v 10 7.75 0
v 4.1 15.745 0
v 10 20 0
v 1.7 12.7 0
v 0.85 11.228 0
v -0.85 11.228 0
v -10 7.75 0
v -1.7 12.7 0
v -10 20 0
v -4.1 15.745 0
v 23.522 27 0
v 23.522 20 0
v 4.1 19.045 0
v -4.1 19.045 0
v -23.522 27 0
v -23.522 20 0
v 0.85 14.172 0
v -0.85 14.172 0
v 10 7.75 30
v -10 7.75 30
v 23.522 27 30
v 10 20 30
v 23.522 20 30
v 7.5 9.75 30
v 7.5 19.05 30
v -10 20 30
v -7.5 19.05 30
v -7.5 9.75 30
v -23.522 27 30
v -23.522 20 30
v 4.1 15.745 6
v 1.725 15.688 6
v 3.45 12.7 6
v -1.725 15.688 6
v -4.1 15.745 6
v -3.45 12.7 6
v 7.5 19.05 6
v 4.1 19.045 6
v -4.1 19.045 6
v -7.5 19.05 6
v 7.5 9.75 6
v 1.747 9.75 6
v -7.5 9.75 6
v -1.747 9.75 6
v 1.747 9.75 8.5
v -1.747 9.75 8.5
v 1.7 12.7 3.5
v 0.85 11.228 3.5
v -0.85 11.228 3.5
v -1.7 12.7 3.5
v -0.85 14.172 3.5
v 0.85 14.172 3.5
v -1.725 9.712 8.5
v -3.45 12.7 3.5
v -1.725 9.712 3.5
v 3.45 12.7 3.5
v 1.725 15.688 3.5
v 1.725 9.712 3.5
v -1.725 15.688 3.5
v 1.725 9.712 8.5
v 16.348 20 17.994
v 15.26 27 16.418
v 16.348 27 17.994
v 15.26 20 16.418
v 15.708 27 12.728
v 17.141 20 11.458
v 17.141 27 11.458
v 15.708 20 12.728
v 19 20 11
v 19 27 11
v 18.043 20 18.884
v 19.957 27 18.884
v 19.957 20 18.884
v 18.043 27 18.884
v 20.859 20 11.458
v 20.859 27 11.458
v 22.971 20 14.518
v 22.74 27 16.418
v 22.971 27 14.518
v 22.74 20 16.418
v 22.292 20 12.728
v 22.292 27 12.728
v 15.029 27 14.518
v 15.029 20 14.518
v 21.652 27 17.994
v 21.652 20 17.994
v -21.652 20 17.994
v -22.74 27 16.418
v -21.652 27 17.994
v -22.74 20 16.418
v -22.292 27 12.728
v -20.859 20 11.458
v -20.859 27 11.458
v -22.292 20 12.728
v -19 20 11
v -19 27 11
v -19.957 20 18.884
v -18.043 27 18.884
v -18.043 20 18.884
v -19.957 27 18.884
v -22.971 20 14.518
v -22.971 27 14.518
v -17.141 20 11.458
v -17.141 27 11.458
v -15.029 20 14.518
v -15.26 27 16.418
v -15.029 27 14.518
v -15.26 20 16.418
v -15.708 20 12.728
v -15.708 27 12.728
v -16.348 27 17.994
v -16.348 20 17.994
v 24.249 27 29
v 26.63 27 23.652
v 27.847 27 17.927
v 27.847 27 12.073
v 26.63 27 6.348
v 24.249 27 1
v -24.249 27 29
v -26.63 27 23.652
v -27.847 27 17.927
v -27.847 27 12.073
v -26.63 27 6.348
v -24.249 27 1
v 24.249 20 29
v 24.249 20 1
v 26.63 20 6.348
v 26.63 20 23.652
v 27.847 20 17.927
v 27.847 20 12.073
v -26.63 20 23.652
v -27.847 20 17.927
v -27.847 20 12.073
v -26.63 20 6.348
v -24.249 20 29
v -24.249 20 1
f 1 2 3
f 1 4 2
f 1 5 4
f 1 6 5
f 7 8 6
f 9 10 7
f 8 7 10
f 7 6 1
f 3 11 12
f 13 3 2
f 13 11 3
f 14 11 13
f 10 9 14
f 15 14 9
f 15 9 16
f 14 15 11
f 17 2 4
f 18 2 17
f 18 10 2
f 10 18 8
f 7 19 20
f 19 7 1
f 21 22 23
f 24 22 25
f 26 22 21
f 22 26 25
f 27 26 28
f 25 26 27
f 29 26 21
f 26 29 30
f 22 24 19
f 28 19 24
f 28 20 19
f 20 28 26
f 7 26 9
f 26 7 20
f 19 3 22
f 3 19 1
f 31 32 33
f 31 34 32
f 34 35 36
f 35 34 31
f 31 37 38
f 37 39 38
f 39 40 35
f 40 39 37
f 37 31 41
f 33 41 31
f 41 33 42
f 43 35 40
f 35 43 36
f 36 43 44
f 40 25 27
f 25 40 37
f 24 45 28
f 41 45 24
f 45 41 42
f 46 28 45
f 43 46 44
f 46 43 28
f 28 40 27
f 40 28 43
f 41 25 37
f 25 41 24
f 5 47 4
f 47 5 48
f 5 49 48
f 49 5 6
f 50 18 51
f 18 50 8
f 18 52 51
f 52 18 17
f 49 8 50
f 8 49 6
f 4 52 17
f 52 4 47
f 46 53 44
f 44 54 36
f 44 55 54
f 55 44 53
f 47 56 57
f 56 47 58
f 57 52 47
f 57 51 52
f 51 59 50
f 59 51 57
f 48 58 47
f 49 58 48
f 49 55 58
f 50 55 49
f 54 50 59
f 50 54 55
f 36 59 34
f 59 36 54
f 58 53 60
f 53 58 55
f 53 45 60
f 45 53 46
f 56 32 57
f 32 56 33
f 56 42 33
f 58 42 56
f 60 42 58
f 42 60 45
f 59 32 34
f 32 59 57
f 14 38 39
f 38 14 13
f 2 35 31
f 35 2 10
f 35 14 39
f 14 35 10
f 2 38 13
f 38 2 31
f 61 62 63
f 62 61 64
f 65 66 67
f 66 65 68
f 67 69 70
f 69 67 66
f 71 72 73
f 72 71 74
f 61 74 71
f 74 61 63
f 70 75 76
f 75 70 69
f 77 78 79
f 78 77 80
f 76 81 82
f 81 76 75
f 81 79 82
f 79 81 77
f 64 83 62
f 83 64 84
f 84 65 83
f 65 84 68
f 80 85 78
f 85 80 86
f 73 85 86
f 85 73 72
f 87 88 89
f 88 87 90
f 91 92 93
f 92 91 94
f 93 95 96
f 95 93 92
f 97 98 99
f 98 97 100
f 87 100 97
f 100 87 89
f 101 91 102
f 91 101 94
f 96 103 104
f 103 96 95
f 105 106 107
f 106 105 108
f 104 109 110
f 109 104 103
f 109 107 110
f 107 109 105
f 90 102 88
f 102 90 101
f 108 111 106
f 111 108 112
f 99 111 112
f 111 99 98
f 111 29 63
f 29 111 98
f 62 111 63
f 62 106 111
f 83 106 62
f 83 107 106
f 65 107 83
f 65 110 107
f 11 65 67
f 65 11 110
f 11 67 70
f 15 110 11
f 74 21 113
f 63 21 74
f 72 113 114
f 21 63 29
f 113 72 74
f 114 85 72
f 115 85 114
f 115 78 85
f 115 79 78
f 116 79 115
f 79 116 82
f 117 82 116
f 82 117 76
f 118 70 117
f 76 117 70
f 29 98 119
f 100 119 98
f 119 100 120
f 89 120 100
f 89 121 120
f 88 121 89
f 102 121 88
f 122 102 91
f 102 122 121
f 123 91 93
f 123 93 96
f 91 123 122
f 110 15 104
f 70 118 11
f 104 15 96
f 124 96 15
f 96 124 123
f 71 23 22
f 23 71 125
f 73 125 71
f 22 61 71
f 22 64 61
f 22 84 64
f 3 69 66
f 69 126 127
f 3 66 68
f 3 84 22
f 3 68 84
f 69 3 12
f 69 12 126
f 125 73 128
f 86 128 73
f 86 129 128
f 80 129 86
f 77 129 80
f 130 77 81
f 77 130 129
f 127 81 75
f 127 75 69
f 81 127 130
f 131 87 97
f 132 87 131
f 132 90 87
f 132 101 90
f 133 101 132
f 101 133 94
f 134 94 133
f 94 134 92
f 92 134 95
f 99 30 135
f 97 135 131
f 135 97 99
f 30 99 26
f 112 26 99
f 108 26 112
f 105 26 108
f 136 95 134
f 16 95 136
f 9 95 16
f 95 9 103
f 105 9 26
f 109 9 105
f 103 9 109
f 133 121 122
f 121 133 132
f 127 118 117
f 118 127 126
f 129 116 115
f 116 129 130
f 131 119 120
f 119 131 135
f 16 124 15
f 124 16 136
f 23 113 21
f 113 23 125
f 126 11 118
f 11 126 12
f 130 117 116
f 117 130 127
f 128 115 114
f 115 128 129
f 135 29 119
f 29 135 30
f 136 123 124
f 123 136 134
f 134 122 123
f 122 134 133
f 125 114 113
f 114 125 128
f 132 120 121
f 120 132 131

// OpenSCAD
// Y-belt retainer/tensioner
// May 2012 John Newman

// This parameter deterimes how far the belt is held above the deck
dRise = 0;			// Added to the depth to make the belt run horizontal

// Belt dimensions - These are for T2.5, see below for T5
//tBase = 1.25;		// Thickness of belt base
//tFull = 2.0;			// Thickness of Belt at teeth
//wTooth = 1.4;		// Width of tooth (not actual, req)
//wSpace = 1.1;		// Width of space
//wBelt = 6.2;		// Width of belt

// Belt dimensions - These are for T5
tBase = 1.5;		// Thickness of belt base
tFull = 2.7;			// Thickness of Belt at teeth
wTooth = 2.6;		// Width of tooth (not actual, req)
wSpace = 2.4;		// Width of space
wBelt = 6.2;		// Width of belt

belt_offset_z = 7;
m6_r = 4;
m6_washer_r = 9;
m6_head_h = 6.1;

// Misc params
wHex = 6.9;		// Width of trap for hex nut
dHex	= 2.5;			// Depth of trap for hex nut
rM3 = 1.7;			// Radius of M3 bolt hole
sDrop = wHex/2-0.5; //2.8;		// Driver screw drop from base of slider
Adjust = 0.5;		// Spacing for things to fit inside other things!
pWidth = 9;			// Screw platform width
pHeight = 5;		// Screw platform height

// Base parameters
bwExt = 20;		// Widest part of base
bwInt = 15;			// inside width, where slider goes
blExt = 30;			// Overall length of base
blHed = 6;			// Head of base whch takes the strain !
bdExt = 12.5;		// This included a minimum floor thickness of 2mm (?)
bRoof = 2.2;		// The thickness of the roof which holds the slider in
bFloor = 1;			// The thickness of the floor under the slider (minimum)
bdSoc = bdExt-(bRoof+bFloor);		// 'Socket' depth for slider to go in

// Slider parameters
swMax = bwInt - Adjust;	// Wide part of slider
sdMax = bdSoc-Adjust;		// Height of slider

lBelt = blExt*2;		// Length of a bit of belt!
rMsk = blExt/3 ;		// Radius of part of mount masking...


// Print the parts as req.
translate([0,15,blExt/2]) rotate([0,90,90]) basepart();

module sliderpart() {
	difference() {
		cube([blExt-blHed,swMax,sdMax],center=true);
		// Make a hole for the bolt end
		translate([(blExt-blHed)/2-2,0,(sdMax/2)-sDrop]) rotate([30,0,0]) rotate([0,90,0]) cylinder(10,rM3+0.5,rM3+0.5,$fn=6);
		// Make a fracture to cause fill
		translate([(blExt-blHed)/2-4.2,0,(sdMax-tFull)/2+1]) cube([0.05,swMax-4.4,sdMax],center=true) ;
		// Finally indent for belt
		translate([-lBelt/2,-wBelt/2,-sdMax/2-0.1]) belt();
	}
}

// Note this is positioned so that the slider is centered on the XY plane
module basepart() {
	union() {
		difference() {
			translate([0,0,-dRise/2 - 1]) cube([blExt,bwExt,bdExt+dRise],center=true);
			// Remove the space for the slider
			translate([-blHed,0,(bFloor-bRoof)/2]) cube([blExt,bwInt,bdSoc],center=true);
			// Remove a hole for the bolt
			translate([(blExt/2-9),0,bFloor+sDrop-bdExt/2]) rotate([30,0,0]) rotate([0,90,0]) cylinder(15,rM3,rM3);
			// An indentation for the bolt head
			translate([(blExt/2)-(blHed+5-dHex),0,bFloor+sDrop-bdExt/2]) rotate([30,0,0]) rotate([0,90,0]) cylinder(5,wHex/2,wHex/2,$fn=6);
			// A slot for the belt to come through
			translate([blExt/2-blHed,0,(bdExt-tFull-0.61)/2-bRoof]) cube([15,wBelt+2,tFull+0.6],center=true);
		}
		mount();
	}
}

module mount(){
	z_off = -1 + bdExt + dRise;
	mount_y = bwExt + 4 * m6_washer_r;
	translate([-0.5 * blExt,-0.5 * mount_y, 5]){
		intersection(){
			translate([0.5 * blExt,0.5 * mount_y, 0])cylinder(r=mount_y / 2, h = belt_offset_z);
			difference(){
				cube([blExt,mount_y,belt_offset_z]);		
				translate([blExt * 0.5,0,-0.5 * belt_offset_z]){
					translate([0,m6_washer_r,0])cylinder(r=4, h = 2 * belt_offset_z);
					translate([0,mount_y - m6_washer_r,0])cylinder(r=4, h = 2 * belt_offset_z);
				}
			}
		}
	}
	
}

module belt() {
	cube([lBelt,wBelt,tBase]) ;
	for (inc = [0:(wTooth+wSpace):lBelt-wTooth]) translate([inc,0,tBase-0.01]) cube([wTooth,wBelt,(tFull-tBase)]) ;
}
